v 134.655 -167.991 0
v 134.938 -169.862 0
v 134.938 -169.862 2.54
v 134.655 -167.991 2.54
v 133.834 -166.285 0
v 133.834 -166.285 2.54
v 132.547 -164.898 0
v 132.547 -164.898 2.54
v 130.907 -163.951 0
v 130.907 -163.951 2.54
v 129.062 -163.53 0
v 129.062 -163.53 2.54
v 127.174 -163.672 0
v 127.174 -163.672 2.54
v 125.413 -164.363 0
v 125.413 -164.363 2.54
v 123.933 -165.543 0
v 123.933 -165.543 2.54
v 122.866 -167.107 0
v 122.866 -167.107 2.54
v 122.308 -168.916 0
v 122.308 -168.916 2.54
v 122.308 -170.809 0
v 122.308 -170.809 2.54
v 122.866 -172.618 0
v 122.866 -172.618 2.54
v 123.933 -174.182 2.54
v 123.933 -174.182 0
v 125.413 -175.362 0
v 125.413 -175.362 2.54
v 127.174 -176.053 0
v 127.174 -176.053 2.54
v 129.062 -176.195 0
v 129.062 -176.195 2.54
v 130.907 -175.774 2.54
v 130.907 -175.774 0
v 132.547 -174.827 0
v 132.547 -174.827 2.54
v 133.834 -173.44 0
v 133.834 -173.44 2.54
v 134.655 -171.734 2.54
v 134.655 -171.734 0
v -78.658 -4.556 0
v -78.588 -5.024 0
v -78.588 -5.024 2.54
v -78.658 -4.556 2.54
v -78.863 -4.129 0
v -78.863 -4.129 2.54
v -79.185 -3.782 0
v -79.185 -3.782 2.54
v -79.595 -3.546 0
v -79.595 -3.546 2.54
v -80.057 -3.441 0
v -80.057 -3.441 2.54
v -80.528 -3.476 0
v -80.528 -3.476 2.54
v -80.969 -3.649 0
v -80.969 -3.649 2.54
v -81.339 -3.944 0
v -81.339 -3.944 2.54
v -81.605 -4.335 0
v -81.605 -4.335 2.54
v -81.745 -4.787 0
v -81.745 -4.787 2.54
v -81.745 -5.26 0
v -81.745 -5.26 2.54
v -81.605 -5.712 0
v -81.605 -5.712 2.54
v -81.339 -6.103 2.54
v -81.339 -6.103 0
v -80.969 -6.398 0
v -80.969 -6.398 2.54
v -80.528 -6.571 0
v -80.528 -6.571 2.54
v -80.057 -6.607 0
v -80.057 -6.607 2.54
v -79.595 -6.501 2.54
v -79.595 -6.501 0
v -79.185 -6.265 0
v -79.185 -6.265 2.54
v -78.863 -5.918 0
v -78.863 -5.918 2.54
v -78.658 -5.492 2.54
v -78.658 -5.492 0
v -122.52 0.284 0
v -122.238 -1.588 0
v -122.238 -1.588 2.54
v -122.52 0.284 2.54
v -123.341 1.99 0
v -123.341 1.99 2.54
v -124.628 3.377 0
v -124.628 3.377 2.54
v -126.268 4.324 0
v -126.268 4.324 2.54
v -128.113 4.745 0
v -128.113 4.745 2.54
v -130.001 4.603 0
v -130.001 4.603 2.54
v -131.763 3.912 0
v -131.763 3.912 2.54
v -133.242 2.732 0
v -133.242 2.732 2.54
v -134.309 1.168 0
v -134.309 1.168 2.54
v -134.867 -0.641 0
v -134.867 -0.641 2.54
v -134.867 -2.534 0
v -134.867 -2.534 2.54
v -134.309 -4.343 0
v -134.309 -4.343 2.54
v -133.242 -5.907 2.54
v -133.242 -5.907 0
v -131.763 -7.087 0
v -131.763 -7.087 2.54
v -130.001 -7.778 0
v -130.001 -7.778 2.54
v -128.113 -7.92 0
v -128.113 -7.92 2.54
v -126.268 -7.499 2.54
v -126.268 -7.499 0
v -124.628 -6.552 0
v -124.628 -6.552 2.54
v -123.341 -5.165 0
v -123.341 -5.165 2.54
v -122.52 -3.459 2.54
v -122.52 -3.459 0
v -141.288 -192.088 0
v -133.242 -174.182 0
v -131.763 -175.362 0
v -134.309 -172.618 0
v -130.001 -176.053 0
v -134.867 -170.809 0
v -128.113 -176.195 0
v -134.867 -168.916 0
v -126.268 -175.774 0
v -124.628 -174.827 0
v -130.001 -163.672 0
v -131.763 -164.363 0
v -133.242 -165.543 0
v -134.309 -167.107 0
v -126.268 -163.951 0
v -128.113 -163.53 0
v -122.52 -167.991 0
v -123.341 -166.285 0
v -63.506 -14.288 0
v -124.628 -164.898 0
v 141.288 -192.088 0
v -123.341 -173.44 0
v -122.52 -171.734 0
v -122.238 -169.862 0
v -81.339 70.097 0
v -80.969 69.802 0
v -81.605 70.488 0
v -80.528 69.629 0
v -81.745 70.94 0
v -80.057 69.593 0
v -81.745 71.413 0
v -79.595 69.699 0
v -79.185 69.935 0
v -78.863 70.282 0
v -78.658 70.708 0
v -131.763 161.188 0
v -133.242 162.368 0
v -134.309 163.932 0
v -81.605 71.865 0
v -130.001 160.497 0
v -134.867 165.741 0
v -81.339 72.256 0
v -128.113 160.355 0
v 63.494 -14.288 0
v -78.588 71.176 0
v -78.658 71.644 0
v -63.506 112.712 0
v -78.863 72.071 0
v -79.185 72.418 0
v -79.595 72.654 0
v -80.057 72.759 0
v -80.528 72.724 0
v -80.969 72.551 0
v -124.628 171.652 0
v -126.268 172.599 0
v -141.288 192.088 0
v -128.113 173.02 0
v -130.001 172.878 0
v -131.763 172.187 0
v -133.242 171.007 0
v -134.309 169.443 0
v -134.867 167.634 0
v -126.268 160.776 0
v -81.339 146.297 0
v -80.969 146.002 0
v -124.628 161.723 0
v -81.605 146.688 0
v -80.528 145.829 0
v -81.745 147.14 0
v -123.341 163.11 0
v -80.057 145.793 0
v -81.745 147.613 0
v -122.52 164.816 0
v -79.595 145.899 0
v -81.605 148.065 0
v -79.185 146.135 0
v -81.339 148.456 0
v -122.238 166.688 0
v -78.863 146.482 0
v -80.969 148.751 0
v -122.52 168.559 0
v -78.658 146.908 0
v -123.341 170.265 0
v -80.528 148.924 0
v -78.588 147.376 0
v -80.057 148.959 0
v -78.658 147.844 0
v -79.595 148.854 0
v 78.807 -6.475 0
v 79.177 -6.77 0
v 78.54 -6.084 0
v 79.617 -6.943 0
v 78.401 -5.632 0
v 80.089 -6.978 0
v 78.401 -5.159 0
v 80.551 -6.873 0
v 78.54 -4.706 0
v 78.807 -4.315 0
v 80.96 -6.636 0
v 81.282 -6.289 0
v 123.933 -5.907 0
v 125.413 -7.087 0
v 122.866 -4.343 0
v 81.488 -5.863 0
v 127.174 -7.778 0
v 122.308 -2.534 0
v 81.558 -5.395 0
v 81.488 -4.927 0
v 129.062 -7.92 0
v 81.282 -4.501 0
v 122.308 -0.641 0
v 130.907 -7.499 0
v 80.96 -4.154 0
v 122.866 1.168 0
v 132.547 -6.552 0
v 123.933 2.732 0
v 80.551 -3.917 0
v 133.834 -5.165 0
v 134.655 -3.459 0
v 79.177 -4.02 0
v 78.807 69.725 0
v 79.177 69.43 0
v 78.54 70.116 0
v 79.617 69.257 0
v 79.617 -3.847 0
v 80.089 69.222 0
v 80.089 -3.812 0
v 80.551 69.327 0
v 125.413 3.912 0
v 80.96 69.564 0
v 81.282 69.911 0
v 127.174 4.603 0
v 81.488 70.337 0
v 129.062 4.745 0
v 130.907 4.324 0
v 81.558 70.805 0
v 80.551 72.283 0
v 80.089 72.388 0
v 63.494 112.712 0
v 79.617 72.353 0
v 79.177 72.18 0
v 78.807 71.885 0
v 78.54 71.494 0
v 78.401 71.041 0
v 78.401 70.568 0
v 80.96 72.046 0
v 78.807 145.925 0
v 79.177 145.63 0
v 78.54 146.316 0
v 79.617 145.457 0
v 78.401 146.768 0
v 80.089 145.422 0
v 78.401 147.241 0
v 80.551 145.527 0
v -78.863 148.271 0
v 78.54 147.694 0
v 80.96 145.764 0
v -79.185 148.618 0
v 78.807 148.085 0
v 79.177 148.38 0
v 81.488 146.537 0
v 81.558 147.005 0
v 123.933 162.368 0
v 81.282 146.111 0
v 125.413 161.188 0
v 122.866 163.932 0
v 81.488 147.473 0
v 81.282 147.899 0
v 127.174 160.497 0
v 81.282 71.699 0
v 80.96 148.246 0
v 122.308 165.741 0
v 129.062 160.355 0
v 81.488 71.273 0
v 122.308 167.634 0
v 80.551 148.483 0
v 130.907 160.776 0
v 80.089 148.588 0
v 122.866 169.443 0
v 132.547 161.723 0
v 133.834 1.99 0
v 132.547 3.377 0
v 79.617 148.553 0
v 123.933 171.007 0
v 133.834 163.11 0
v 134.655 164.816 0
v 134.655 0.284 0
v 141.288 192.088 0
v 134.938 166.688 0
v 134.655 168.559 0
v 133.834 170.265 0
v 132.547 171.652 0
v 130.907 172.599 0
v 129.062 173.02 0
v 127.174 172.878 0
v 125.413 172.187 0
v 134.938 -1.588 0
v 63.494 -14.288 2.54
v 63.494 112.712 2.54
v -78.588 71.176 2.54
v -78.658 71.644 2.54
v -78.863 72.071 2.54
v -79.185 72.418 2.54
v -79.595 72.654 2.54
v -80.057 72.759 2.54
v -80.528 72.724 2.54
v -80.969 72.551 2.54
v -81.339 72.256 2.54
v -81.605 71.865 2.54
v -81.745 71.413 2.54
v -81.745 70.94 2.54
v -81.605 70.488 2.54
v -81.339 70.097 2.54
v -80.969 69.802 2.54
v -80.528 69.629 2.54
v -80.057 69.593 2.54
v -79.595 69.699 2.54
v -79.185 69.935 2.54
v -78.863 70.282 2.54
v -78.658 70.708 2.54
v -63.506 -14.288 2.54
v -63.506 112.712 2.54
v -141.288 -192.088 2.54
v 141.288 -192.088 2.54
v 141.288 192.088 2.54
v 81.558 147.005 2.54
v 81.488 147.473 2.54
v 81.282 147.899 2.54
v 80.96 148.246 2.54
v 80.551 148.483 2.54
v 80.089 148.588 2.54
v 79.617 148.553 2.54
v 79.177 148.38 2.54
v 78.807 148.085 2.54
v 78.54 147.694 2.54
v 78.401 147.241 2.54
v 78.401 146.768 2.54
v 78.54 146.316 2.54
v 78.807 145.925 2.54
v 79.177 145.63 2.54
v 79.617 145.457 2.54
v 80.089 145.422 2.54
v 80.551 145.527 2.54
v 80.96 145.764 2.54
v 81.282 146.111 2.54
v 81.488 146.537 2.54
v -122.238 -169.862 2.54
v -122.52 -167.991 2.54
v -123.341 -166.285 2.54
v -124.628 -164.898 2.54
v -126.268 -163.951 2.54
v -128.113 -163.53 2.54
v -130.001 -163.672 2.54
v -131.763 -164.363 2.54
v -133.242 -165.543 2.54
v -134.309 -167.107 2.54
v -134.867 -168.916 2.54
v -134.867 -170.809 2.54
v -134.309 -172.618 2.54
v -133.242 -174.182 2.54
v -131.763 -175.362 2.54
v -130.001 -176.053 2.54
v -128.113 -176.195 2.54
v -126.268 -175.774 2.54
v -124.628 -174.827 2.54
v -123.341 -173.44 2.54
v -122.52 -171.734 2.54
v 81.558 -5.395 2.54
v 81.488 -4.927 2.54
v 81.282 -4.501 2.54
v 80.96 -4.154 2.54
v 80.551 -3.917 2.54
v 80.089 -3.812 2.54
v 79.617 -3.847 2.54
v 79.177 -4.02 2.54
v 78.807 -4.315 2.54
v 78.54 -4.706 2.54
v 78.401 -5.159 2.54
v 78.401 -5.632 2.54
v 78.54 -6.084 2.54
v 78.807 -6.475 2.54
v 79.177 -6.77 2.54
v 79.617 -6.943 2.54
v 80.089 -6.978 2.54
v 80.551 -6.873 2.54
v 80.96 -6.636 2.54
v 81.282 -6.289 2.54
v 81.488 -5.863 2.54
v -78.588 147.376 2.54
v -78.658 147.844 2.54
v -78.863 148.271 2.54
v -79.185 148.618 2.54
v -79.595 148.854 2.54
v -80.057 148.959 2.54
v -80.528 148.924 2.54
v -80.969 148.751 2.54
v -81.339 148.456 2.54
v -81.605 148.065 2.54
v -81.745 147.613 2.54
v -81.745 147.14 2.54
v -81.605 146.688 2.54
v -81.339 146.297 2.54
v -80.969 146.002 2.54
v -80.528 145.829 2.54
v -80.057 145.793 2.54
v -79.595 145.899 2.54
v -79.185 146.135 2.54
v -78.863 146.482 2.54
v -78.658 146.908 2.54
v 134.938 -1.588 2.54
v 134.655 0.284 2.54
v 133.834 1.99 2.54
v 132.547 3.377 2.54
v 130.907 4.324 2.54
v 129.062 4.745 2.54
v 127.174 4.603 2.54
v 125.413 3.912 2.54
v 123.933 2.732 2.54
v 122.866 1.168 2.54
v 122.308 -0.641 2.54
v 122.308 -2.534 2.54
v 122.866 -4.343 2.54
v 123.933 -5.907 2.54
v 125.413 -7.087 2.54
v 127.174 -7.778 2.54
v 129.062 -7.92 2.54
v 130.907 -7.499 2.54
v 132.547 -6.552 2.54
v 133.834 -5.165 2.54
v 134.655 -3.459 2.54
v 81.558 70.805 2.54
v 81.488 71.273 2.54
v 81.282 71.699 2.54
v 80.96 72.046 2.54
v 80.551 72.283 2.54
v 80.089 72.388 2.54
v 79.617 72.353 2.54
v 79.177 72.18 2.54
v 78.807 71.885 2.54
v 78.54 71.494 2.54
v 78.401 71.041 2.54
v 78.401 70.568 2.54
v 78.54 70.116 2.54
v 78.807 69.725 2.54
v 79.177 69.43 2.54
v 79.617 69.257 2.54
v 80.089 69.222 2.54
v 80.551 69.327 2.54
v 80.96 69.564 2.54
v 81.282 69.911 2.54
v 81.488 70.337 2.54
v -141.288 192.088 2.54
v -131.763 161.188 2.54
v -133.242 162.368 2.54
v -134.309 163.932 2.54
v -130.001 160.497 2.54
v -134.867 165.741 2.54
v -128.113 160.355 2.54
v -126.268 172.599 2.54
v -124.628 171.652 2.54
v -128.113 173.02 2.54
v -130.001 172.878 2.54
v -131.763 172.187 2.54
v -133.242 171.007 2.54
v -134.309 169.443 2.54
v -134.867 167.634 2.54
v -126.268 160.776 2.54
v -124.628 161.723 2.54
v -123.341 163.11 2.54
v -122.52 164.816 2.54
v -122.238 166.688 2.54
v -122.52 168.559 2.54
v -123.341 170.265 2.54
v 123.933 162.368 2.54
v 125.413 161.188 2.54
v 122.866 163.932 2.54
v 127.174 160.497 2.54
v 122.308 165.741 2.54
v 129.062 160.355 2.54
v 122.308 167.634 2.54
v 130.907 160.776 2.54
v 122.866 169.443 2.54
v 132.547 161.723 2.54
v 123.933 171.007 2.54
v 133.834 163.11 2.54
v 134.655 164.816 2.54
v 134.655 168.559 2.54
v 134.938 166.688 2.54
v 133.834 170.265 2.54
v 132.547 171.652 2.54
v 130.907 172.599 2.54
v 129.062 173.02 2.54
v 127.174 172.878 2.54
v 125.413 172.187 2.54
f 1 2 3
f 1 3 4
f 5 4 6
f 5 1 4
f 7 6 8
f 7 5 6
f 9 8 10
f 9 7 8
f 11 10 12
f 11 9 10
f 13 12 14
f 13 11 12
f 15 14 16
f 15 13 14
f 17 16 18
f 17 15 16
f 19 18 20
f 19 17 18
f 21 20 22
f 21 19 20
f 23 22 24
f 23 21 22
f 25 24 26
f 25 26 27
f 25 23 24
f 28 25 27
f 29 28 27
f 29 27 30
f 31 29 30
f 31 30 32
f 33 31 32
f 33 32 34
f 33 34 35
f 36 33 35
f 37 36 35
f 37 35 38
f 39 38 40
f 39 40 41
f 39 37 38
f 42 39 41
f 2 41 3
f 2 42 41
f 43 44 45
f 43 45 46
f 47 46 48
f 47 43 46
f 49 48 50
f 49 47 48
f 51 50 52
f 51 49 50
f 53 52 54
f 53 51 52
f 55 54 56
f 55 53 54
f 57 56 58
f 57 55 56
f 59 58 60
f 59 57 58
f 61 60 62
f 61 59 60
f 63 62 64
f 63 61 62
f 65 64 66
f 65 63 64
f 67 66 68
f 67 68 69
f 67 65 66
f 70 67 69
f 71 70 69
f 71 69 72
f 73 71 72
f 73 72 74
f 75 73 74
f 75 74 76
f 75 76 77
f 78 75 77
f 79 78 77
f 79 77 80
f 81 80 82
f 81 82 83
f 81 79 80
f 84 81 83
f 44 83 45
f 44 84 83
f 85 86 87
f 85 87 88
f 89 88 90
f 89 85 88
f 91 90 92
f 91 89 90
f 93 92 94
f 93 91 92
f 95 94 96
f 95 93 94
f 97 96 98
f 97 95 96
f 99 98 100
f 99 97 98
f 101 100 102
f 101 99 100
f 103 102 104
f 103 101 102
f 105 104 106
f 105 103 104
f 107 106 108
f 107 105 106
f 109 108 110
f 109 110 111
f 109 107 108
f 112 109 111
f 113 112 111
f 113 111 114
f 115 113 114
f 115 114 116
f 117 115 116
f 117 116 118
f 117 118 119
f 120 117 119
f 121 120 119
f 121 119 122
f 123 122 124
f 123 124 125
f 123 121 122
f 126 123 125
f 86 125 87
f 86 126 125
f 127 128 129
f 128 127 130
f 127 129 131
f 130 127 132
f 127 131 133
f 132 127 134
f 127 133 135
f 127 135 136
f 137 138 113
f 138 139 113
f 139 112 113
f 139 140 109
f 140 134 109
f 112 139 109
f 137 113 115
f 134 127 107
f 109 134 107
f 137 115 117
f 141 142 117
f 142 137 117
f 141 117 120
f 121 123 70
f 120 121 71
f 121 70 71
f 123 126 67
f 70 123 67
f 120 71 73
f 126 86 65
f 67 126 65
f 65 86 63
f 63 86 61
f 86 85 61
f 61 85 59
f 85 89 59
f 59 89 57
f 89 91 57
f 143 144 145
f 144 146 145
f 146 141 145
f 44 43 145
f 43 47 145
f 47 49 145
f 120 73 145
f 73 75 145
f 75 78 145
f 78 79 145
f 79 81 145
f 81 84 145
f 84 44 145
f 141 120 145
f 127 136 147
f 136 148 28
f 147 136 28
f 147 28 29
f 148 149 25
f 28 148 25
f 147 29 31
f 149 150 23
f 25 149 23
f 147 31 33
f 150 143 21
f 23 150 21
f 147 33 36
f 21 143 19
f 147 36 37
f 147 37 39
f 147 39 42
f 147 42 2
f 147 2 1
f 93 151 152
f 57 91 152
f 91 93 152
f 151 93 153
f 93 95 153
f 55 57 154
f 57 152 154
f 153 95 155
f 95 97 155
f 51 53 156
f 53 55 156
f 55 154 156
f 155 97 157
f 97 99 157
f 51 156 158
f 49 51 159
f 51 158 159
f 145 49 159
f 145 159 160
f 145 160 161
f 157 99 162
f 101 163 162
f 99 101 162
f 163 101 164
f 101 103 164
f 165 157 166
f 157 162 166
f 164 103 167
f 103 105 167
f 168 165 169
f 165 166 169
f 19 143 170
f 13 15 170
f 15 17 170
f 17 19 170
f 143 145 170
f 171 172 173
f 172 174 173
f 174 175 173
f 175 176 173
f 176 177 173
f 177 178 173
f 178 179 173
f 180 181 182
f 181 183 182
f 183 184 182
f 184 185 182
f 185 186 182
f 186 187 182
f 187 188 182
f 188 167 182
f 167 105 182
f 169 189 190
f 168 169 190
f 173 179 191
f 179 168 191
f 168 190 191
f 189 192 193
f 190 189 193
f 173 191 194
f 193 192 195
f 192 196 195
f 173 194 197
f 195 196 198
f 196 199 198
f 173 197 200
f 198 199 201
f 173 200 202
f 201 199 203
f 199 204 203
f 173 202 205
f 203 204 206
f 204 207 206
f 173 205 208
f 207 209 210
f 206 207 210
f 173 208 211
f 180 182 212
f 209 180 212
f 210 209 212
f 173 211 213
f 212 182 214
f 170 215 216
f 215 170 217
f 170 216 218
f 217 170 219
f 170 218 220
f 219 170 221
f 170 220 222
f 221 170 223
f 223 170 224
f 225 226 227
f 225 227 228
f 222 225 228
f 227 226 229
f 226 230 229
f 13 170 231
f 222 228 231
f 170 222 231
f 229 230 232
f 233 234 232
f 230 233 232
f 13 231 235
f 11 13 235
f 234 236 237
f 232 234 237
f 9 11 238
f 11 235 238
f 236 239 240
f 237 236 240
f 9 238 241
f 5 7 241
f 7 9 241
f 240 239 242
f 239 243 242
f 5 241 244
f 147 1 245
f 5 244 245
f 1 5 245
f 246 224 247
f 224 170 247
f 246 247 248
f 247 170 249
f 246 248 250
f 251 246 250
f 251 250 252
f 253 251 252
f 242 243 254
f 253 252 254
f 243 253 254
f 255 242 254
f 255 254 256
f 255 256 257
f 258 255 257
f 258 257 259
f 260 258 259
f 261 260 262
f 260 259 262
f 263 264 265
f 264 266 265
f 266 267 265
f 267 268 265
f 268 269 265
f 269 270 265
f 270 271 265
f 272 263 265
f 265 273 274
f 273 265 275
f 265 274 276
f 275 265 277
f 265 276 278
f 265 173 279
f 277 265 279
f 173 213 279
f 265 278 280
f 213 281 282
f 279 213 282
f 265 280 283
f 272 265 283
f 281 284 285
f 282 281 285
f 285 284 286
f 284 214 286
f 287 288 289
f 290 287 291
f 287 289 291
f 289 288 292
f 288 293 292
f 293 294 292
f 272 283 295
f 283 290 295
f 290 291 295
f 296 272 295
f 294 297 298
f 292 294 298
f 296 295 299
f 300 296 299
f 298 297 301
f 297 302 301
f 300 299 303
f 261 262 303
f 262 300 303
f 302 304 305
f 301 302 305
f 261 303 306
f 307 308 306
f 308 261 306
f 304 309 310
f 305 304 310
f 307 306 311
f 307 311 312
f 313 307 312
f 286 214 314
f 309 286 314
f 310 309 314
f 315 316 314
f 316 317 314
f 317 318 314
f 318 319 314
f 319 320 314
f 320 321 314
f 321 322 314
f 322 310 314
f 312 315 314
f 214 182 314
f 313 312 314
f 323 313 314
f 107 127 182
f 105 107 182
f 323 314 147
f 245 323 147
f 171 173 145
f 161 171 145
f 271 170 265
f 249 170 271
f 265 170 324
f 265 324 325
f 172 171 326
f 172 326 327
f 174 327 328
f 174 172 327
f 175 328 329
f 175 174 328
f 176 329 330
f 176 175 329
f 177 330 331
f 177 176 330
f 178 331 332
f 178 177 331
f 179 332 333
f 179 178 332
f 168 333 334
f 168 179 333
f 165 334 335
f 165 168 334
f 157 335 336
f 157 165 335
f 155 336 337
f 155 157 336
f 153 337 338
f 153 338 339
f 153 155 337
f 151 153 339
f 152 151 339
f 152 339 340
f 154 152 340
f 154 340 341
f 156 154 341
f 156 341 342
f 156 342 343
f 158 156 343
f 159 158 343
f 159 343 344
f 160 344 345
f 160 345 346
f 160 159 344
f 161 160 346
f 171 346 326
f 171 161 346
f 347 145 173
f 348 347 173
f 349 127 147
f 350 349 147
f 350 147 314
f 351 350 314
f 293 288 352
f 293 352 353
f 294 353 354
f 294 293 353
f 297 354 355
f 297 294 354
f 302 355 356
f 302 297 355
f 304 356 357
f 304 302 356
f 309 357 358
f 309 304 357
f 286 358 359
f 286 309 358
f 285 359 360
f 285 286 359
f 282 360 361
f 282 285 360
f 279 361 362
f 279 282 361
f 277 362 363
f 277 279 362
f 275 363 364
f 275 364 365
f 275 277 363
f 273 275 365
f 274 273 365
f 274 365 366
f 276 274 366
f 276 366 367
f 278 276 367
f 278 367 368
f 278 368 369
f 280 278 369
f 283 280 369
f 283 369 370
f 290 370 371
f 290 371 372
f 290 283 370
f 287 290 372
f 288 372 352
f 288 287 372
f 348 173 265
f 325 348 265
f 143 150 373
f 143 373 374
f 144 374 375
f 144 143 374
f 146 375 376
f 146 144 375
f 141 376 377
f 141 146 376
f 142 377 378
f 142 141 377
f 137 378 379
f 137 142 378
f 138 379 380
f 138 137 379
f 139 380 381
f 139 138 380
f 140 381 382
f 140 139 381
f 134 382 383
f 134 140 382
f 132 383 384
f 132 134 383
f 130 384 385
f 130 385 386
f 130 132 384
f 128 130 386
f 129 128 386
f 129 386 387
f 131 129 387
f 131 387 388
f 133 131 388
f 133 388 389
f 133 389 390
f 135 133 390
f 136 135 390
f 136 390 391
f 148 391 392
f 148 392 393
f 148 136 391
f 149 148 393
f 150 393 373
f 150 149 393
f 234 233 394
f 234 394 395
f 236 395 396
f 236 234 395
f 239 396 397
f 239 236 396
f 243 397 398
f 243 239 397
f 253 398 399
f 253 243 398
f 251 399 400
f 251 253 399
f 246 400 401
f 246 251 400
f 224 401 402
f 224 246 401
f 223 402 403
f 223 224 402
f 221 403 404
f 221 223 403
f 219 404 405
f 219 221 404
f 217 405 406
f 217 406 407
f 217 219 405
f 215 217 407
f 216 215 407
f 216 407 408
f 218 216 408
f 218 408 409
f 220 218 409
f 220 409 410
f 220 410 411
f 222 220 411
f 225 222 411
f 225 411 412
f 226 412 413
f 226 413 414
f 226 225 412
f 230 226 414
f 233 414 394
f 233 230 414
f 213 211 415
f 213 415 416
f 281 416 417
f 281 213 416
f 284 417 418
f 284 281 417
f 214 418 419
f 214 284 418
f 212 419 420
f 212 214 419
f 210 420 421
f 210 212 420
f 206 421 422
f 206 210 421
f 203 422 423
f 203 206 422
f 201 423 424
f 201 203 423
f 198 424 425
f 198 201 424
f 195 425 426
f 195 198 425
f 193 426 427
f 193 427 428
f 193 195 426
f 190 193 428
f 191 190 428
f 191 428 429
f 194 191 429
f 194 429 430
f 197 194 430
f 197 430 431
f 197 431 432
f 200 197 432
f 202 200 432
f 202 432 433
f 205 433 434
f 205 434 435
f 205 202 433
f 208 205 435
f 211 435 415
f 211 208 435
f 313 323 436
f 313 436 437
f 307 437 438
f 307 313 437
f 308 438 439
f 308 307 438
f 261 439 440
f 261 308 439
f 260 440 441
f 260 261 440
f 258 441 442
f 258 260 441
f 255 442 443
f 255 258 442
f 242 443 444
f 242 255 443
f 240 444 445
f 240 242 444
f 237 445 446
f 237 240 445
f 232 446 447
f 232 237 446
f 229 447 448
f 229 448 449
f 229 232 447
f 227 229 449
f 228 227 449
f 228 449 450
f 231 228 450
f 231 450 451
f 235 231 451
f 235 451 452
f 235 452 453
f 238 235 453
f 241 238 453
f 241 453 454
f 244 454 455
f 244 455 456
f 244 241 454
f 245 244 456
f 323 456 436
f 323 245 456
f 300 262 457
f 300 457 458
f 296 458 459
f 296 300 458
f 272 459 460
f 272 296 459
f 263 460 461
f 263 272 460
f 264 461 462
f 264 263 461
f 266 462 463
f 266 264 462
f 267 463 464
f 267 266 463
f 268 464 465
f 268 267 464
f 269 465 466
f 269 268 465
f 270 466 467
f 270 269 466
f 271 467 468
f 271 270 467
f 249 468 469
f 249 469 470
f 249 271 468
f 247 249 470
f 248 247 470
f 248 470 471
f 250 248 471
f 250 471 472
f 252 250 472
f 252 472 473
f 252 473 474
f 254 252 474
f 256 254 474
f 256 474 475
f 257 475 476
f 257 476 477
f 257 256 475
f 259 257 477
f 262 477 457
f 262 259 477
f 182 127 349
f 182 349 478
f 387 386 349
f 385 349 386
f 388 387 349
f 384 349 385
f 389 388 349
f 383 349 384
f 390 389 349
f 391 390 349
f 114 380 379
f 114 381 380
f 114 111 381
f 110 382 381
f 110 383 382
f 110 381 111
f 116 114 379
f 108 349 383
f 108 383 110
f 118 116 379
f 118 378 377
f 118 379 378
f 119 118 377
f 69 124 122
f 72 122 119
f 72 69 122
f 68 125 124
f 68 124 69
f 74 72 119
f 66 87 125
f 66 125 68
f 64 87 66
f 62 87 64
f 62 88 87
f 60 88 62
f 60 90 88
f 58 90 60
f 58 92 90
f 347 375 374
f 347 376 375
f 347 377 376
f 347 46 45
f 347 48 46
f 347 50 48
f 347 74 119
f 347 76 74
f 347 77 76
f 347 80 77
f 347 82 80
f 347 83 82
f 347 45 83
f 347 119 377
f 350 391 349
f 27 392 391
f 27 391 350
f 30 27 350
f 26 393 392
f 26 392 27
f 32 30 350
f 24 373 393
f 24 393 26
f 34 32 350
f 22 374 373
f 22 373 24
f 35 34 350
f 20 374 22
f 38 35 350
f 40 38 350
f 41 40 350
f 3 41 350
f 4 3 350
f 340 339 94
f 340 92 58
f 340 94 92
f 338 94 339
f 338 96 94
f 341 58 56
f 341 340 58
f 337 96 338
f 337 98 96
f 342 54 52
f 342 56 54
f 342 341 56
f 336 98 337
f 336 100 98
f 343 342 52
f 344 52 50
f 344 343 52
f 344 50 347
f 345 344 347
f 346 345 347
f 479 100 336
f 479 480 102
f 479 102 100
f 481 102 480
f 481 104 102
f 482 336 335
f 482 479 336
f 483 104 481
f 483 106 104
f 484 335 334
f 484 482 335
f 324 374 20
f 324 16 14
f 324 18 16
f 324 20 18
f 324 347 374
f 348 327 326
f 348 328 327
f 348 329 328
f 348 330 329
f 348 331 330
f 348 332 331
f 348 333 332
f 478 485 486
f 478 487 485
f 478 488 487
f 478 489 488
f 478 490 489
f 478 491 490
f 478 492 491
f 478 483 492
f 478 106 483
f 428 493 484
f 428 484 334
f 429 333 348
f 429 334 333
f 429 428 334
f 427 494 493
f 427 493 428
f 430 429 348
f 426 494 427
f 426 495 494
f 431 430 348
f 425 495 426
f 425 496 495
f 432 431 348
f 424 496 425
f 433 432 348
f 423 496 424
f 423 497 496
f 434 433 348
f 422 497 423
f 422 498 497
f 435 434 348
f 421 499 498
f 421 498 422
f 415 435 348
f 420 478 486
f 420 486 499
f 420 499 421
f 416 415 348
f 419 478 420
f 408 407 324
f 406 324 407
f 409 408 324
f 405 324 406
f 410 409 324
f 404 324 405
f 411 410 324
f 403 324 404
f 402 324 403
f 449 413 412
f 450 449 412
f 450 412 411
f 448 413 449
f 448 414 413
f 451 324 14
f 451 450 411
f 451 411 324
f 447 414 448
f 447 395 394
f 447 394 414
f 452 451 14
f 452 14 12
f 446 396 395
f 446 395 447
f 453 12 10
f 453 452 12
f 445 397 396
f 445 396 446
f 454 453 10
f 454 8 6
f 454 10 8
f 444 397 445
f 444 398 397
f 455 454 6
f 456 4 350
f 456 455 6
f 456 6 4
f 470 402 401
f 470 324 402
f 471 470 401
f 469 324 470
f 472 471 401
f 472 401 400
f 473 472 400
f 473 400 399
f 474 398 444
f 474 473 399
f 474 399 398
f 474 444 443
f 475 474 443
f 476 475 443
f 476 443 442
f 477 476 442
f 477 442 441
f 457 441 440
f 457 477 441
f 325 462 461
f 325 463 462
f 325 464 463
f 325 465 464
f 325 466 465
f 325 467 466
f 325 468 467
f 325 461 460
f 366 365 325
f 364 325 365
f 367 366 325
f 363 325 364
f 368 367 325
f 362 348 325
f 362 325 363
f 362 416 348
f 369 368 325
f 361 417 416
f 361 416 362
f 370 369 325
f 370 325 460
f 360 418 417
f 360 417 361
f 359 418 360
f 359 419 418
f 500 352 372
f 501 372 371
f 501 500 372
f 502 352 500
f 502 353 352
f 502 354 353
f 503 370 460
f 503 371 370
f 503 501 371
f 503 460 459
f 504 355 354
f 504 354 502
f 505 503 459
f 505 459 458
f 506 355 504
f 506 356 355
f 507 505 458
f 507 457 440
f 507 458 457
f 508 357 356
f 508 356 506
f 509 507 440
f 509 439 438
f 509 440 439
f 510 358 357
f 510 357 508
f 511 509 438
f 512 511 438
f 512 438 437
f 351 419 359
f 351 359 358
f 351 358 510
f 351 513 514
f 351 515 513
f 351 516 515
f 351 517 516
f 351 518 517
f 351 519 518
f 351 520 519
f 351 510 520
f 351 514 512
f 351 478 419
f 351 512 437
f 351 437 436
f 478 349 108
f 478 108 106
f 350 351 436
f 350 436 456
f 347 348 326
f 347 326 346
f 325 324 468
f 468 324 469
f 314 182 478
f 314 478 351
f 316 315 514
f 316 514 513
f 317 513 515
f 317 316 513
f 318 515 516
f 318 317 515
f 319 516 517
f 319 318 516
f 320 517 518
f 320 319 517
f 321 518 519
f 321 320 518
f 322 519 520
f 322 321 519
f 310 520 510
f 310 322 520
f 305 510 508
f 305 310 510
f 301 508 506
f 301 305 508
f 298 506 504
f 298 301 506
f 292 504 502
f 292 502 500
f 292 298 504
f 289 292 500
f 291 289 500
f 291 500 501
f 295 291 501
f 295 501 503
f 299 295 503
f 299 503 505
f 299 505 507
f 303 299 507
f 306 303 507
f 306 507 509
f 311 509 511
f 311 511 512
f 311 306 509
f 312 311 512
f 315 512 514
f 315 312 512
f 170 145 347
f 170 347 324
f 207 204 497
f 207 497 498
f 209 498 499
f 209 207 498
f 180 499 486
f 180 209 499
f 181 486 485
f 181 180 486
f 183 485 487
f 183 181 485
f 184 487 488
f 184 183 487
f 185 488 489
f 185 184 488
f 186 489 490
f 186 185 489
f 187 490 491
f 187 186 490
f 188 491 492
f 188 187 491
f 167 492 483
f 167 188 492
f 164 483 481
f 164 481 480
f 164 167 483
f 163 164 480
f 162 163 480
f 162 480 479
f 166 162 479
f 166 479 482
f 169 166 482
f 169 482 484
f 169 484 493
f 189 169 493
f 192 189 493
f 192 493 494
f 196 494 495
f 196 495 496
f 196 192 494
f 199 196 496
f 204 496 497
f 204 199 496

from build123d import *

# Parameters (mm, degrees)
SKETCH1_W           = 282.575
SKETCH1_H           = 384.175
SKETCH1_R           = 6.35
SKETCH1_R_2         = 1.5875
SKETCH1_W_2         = 127
SKETCH1_H_2         = 127
BOSS_EXTRUDE1_DEPTH = 2.54


with BuildPart() as part:
    # Sketch1 → Boss-Extrude1 (new body)
    with BuildSketch(Plane.XY):
        Rectangle(SKETCH1_W, SKETCH1_H)
        with Locations((-128.5875, 166.6875)):
            Circle(SKETCH1_R, mode=Mode.SUBTRACT)
        with Locations((-128.5875, -1.5875)):
            Circle(SKETCH1_R, mode=Mode.SUBTRACT)
        with Locations((-128.5875, -169.8625)):
            Circle(SKETCH1_R, mode=Mode.SUBTRACT)
        with Locations((128.5875, -1.5875)):
            Circle(SKETCH1_R, mode=Mode.SUBTRACT)
        with Locations((128.5875, 166.6875)):
            Circle(SKETCH1_R, mode=Mode.SUBTRACT)
        with Locations((128.5875, -169.8625)):
            Circle(SKETCH1_R, mode=Mode.SUBTRACT)
        with Locations((-80.175152311, 147.376386757)):
            Circle(SKETCH1_R_2, mode=Mode.SUBTRACT)
        with Locations((-80.175152311, 71.176386757)):
            Circle(SKETCH1_R_2, mode=Mode.SUBTRACT)
        with Locations((-80.175152311, -5.023613243)):
            Circle(SKETCH1_R_2, mode=Mode.SUBTRACT)
        with Locations((79.970650499, -5.395164494)):
            Circle(SKETCH1_R_2, mode=Mode.SUBTRACT)
        with Locations((79.970650499, 70.804835506)):
            Circle(SKETCH1_R_2, mode=Mode.SUBTRACT)
        with Locations((79.970650499, 147.004835506)):
            Circle(SKETCH1_R_2, mode=Mode.SUBTRACT)
        with Locations((-0.006402311, 49.2125)):
            Rectangle(SKETCH1_W_2, SKETCH1_H_2, mode=Mode.SUBTRACT)
    extrude(amount=BOSS_EXTRUDE1_DEPTH)


solid = part.part
